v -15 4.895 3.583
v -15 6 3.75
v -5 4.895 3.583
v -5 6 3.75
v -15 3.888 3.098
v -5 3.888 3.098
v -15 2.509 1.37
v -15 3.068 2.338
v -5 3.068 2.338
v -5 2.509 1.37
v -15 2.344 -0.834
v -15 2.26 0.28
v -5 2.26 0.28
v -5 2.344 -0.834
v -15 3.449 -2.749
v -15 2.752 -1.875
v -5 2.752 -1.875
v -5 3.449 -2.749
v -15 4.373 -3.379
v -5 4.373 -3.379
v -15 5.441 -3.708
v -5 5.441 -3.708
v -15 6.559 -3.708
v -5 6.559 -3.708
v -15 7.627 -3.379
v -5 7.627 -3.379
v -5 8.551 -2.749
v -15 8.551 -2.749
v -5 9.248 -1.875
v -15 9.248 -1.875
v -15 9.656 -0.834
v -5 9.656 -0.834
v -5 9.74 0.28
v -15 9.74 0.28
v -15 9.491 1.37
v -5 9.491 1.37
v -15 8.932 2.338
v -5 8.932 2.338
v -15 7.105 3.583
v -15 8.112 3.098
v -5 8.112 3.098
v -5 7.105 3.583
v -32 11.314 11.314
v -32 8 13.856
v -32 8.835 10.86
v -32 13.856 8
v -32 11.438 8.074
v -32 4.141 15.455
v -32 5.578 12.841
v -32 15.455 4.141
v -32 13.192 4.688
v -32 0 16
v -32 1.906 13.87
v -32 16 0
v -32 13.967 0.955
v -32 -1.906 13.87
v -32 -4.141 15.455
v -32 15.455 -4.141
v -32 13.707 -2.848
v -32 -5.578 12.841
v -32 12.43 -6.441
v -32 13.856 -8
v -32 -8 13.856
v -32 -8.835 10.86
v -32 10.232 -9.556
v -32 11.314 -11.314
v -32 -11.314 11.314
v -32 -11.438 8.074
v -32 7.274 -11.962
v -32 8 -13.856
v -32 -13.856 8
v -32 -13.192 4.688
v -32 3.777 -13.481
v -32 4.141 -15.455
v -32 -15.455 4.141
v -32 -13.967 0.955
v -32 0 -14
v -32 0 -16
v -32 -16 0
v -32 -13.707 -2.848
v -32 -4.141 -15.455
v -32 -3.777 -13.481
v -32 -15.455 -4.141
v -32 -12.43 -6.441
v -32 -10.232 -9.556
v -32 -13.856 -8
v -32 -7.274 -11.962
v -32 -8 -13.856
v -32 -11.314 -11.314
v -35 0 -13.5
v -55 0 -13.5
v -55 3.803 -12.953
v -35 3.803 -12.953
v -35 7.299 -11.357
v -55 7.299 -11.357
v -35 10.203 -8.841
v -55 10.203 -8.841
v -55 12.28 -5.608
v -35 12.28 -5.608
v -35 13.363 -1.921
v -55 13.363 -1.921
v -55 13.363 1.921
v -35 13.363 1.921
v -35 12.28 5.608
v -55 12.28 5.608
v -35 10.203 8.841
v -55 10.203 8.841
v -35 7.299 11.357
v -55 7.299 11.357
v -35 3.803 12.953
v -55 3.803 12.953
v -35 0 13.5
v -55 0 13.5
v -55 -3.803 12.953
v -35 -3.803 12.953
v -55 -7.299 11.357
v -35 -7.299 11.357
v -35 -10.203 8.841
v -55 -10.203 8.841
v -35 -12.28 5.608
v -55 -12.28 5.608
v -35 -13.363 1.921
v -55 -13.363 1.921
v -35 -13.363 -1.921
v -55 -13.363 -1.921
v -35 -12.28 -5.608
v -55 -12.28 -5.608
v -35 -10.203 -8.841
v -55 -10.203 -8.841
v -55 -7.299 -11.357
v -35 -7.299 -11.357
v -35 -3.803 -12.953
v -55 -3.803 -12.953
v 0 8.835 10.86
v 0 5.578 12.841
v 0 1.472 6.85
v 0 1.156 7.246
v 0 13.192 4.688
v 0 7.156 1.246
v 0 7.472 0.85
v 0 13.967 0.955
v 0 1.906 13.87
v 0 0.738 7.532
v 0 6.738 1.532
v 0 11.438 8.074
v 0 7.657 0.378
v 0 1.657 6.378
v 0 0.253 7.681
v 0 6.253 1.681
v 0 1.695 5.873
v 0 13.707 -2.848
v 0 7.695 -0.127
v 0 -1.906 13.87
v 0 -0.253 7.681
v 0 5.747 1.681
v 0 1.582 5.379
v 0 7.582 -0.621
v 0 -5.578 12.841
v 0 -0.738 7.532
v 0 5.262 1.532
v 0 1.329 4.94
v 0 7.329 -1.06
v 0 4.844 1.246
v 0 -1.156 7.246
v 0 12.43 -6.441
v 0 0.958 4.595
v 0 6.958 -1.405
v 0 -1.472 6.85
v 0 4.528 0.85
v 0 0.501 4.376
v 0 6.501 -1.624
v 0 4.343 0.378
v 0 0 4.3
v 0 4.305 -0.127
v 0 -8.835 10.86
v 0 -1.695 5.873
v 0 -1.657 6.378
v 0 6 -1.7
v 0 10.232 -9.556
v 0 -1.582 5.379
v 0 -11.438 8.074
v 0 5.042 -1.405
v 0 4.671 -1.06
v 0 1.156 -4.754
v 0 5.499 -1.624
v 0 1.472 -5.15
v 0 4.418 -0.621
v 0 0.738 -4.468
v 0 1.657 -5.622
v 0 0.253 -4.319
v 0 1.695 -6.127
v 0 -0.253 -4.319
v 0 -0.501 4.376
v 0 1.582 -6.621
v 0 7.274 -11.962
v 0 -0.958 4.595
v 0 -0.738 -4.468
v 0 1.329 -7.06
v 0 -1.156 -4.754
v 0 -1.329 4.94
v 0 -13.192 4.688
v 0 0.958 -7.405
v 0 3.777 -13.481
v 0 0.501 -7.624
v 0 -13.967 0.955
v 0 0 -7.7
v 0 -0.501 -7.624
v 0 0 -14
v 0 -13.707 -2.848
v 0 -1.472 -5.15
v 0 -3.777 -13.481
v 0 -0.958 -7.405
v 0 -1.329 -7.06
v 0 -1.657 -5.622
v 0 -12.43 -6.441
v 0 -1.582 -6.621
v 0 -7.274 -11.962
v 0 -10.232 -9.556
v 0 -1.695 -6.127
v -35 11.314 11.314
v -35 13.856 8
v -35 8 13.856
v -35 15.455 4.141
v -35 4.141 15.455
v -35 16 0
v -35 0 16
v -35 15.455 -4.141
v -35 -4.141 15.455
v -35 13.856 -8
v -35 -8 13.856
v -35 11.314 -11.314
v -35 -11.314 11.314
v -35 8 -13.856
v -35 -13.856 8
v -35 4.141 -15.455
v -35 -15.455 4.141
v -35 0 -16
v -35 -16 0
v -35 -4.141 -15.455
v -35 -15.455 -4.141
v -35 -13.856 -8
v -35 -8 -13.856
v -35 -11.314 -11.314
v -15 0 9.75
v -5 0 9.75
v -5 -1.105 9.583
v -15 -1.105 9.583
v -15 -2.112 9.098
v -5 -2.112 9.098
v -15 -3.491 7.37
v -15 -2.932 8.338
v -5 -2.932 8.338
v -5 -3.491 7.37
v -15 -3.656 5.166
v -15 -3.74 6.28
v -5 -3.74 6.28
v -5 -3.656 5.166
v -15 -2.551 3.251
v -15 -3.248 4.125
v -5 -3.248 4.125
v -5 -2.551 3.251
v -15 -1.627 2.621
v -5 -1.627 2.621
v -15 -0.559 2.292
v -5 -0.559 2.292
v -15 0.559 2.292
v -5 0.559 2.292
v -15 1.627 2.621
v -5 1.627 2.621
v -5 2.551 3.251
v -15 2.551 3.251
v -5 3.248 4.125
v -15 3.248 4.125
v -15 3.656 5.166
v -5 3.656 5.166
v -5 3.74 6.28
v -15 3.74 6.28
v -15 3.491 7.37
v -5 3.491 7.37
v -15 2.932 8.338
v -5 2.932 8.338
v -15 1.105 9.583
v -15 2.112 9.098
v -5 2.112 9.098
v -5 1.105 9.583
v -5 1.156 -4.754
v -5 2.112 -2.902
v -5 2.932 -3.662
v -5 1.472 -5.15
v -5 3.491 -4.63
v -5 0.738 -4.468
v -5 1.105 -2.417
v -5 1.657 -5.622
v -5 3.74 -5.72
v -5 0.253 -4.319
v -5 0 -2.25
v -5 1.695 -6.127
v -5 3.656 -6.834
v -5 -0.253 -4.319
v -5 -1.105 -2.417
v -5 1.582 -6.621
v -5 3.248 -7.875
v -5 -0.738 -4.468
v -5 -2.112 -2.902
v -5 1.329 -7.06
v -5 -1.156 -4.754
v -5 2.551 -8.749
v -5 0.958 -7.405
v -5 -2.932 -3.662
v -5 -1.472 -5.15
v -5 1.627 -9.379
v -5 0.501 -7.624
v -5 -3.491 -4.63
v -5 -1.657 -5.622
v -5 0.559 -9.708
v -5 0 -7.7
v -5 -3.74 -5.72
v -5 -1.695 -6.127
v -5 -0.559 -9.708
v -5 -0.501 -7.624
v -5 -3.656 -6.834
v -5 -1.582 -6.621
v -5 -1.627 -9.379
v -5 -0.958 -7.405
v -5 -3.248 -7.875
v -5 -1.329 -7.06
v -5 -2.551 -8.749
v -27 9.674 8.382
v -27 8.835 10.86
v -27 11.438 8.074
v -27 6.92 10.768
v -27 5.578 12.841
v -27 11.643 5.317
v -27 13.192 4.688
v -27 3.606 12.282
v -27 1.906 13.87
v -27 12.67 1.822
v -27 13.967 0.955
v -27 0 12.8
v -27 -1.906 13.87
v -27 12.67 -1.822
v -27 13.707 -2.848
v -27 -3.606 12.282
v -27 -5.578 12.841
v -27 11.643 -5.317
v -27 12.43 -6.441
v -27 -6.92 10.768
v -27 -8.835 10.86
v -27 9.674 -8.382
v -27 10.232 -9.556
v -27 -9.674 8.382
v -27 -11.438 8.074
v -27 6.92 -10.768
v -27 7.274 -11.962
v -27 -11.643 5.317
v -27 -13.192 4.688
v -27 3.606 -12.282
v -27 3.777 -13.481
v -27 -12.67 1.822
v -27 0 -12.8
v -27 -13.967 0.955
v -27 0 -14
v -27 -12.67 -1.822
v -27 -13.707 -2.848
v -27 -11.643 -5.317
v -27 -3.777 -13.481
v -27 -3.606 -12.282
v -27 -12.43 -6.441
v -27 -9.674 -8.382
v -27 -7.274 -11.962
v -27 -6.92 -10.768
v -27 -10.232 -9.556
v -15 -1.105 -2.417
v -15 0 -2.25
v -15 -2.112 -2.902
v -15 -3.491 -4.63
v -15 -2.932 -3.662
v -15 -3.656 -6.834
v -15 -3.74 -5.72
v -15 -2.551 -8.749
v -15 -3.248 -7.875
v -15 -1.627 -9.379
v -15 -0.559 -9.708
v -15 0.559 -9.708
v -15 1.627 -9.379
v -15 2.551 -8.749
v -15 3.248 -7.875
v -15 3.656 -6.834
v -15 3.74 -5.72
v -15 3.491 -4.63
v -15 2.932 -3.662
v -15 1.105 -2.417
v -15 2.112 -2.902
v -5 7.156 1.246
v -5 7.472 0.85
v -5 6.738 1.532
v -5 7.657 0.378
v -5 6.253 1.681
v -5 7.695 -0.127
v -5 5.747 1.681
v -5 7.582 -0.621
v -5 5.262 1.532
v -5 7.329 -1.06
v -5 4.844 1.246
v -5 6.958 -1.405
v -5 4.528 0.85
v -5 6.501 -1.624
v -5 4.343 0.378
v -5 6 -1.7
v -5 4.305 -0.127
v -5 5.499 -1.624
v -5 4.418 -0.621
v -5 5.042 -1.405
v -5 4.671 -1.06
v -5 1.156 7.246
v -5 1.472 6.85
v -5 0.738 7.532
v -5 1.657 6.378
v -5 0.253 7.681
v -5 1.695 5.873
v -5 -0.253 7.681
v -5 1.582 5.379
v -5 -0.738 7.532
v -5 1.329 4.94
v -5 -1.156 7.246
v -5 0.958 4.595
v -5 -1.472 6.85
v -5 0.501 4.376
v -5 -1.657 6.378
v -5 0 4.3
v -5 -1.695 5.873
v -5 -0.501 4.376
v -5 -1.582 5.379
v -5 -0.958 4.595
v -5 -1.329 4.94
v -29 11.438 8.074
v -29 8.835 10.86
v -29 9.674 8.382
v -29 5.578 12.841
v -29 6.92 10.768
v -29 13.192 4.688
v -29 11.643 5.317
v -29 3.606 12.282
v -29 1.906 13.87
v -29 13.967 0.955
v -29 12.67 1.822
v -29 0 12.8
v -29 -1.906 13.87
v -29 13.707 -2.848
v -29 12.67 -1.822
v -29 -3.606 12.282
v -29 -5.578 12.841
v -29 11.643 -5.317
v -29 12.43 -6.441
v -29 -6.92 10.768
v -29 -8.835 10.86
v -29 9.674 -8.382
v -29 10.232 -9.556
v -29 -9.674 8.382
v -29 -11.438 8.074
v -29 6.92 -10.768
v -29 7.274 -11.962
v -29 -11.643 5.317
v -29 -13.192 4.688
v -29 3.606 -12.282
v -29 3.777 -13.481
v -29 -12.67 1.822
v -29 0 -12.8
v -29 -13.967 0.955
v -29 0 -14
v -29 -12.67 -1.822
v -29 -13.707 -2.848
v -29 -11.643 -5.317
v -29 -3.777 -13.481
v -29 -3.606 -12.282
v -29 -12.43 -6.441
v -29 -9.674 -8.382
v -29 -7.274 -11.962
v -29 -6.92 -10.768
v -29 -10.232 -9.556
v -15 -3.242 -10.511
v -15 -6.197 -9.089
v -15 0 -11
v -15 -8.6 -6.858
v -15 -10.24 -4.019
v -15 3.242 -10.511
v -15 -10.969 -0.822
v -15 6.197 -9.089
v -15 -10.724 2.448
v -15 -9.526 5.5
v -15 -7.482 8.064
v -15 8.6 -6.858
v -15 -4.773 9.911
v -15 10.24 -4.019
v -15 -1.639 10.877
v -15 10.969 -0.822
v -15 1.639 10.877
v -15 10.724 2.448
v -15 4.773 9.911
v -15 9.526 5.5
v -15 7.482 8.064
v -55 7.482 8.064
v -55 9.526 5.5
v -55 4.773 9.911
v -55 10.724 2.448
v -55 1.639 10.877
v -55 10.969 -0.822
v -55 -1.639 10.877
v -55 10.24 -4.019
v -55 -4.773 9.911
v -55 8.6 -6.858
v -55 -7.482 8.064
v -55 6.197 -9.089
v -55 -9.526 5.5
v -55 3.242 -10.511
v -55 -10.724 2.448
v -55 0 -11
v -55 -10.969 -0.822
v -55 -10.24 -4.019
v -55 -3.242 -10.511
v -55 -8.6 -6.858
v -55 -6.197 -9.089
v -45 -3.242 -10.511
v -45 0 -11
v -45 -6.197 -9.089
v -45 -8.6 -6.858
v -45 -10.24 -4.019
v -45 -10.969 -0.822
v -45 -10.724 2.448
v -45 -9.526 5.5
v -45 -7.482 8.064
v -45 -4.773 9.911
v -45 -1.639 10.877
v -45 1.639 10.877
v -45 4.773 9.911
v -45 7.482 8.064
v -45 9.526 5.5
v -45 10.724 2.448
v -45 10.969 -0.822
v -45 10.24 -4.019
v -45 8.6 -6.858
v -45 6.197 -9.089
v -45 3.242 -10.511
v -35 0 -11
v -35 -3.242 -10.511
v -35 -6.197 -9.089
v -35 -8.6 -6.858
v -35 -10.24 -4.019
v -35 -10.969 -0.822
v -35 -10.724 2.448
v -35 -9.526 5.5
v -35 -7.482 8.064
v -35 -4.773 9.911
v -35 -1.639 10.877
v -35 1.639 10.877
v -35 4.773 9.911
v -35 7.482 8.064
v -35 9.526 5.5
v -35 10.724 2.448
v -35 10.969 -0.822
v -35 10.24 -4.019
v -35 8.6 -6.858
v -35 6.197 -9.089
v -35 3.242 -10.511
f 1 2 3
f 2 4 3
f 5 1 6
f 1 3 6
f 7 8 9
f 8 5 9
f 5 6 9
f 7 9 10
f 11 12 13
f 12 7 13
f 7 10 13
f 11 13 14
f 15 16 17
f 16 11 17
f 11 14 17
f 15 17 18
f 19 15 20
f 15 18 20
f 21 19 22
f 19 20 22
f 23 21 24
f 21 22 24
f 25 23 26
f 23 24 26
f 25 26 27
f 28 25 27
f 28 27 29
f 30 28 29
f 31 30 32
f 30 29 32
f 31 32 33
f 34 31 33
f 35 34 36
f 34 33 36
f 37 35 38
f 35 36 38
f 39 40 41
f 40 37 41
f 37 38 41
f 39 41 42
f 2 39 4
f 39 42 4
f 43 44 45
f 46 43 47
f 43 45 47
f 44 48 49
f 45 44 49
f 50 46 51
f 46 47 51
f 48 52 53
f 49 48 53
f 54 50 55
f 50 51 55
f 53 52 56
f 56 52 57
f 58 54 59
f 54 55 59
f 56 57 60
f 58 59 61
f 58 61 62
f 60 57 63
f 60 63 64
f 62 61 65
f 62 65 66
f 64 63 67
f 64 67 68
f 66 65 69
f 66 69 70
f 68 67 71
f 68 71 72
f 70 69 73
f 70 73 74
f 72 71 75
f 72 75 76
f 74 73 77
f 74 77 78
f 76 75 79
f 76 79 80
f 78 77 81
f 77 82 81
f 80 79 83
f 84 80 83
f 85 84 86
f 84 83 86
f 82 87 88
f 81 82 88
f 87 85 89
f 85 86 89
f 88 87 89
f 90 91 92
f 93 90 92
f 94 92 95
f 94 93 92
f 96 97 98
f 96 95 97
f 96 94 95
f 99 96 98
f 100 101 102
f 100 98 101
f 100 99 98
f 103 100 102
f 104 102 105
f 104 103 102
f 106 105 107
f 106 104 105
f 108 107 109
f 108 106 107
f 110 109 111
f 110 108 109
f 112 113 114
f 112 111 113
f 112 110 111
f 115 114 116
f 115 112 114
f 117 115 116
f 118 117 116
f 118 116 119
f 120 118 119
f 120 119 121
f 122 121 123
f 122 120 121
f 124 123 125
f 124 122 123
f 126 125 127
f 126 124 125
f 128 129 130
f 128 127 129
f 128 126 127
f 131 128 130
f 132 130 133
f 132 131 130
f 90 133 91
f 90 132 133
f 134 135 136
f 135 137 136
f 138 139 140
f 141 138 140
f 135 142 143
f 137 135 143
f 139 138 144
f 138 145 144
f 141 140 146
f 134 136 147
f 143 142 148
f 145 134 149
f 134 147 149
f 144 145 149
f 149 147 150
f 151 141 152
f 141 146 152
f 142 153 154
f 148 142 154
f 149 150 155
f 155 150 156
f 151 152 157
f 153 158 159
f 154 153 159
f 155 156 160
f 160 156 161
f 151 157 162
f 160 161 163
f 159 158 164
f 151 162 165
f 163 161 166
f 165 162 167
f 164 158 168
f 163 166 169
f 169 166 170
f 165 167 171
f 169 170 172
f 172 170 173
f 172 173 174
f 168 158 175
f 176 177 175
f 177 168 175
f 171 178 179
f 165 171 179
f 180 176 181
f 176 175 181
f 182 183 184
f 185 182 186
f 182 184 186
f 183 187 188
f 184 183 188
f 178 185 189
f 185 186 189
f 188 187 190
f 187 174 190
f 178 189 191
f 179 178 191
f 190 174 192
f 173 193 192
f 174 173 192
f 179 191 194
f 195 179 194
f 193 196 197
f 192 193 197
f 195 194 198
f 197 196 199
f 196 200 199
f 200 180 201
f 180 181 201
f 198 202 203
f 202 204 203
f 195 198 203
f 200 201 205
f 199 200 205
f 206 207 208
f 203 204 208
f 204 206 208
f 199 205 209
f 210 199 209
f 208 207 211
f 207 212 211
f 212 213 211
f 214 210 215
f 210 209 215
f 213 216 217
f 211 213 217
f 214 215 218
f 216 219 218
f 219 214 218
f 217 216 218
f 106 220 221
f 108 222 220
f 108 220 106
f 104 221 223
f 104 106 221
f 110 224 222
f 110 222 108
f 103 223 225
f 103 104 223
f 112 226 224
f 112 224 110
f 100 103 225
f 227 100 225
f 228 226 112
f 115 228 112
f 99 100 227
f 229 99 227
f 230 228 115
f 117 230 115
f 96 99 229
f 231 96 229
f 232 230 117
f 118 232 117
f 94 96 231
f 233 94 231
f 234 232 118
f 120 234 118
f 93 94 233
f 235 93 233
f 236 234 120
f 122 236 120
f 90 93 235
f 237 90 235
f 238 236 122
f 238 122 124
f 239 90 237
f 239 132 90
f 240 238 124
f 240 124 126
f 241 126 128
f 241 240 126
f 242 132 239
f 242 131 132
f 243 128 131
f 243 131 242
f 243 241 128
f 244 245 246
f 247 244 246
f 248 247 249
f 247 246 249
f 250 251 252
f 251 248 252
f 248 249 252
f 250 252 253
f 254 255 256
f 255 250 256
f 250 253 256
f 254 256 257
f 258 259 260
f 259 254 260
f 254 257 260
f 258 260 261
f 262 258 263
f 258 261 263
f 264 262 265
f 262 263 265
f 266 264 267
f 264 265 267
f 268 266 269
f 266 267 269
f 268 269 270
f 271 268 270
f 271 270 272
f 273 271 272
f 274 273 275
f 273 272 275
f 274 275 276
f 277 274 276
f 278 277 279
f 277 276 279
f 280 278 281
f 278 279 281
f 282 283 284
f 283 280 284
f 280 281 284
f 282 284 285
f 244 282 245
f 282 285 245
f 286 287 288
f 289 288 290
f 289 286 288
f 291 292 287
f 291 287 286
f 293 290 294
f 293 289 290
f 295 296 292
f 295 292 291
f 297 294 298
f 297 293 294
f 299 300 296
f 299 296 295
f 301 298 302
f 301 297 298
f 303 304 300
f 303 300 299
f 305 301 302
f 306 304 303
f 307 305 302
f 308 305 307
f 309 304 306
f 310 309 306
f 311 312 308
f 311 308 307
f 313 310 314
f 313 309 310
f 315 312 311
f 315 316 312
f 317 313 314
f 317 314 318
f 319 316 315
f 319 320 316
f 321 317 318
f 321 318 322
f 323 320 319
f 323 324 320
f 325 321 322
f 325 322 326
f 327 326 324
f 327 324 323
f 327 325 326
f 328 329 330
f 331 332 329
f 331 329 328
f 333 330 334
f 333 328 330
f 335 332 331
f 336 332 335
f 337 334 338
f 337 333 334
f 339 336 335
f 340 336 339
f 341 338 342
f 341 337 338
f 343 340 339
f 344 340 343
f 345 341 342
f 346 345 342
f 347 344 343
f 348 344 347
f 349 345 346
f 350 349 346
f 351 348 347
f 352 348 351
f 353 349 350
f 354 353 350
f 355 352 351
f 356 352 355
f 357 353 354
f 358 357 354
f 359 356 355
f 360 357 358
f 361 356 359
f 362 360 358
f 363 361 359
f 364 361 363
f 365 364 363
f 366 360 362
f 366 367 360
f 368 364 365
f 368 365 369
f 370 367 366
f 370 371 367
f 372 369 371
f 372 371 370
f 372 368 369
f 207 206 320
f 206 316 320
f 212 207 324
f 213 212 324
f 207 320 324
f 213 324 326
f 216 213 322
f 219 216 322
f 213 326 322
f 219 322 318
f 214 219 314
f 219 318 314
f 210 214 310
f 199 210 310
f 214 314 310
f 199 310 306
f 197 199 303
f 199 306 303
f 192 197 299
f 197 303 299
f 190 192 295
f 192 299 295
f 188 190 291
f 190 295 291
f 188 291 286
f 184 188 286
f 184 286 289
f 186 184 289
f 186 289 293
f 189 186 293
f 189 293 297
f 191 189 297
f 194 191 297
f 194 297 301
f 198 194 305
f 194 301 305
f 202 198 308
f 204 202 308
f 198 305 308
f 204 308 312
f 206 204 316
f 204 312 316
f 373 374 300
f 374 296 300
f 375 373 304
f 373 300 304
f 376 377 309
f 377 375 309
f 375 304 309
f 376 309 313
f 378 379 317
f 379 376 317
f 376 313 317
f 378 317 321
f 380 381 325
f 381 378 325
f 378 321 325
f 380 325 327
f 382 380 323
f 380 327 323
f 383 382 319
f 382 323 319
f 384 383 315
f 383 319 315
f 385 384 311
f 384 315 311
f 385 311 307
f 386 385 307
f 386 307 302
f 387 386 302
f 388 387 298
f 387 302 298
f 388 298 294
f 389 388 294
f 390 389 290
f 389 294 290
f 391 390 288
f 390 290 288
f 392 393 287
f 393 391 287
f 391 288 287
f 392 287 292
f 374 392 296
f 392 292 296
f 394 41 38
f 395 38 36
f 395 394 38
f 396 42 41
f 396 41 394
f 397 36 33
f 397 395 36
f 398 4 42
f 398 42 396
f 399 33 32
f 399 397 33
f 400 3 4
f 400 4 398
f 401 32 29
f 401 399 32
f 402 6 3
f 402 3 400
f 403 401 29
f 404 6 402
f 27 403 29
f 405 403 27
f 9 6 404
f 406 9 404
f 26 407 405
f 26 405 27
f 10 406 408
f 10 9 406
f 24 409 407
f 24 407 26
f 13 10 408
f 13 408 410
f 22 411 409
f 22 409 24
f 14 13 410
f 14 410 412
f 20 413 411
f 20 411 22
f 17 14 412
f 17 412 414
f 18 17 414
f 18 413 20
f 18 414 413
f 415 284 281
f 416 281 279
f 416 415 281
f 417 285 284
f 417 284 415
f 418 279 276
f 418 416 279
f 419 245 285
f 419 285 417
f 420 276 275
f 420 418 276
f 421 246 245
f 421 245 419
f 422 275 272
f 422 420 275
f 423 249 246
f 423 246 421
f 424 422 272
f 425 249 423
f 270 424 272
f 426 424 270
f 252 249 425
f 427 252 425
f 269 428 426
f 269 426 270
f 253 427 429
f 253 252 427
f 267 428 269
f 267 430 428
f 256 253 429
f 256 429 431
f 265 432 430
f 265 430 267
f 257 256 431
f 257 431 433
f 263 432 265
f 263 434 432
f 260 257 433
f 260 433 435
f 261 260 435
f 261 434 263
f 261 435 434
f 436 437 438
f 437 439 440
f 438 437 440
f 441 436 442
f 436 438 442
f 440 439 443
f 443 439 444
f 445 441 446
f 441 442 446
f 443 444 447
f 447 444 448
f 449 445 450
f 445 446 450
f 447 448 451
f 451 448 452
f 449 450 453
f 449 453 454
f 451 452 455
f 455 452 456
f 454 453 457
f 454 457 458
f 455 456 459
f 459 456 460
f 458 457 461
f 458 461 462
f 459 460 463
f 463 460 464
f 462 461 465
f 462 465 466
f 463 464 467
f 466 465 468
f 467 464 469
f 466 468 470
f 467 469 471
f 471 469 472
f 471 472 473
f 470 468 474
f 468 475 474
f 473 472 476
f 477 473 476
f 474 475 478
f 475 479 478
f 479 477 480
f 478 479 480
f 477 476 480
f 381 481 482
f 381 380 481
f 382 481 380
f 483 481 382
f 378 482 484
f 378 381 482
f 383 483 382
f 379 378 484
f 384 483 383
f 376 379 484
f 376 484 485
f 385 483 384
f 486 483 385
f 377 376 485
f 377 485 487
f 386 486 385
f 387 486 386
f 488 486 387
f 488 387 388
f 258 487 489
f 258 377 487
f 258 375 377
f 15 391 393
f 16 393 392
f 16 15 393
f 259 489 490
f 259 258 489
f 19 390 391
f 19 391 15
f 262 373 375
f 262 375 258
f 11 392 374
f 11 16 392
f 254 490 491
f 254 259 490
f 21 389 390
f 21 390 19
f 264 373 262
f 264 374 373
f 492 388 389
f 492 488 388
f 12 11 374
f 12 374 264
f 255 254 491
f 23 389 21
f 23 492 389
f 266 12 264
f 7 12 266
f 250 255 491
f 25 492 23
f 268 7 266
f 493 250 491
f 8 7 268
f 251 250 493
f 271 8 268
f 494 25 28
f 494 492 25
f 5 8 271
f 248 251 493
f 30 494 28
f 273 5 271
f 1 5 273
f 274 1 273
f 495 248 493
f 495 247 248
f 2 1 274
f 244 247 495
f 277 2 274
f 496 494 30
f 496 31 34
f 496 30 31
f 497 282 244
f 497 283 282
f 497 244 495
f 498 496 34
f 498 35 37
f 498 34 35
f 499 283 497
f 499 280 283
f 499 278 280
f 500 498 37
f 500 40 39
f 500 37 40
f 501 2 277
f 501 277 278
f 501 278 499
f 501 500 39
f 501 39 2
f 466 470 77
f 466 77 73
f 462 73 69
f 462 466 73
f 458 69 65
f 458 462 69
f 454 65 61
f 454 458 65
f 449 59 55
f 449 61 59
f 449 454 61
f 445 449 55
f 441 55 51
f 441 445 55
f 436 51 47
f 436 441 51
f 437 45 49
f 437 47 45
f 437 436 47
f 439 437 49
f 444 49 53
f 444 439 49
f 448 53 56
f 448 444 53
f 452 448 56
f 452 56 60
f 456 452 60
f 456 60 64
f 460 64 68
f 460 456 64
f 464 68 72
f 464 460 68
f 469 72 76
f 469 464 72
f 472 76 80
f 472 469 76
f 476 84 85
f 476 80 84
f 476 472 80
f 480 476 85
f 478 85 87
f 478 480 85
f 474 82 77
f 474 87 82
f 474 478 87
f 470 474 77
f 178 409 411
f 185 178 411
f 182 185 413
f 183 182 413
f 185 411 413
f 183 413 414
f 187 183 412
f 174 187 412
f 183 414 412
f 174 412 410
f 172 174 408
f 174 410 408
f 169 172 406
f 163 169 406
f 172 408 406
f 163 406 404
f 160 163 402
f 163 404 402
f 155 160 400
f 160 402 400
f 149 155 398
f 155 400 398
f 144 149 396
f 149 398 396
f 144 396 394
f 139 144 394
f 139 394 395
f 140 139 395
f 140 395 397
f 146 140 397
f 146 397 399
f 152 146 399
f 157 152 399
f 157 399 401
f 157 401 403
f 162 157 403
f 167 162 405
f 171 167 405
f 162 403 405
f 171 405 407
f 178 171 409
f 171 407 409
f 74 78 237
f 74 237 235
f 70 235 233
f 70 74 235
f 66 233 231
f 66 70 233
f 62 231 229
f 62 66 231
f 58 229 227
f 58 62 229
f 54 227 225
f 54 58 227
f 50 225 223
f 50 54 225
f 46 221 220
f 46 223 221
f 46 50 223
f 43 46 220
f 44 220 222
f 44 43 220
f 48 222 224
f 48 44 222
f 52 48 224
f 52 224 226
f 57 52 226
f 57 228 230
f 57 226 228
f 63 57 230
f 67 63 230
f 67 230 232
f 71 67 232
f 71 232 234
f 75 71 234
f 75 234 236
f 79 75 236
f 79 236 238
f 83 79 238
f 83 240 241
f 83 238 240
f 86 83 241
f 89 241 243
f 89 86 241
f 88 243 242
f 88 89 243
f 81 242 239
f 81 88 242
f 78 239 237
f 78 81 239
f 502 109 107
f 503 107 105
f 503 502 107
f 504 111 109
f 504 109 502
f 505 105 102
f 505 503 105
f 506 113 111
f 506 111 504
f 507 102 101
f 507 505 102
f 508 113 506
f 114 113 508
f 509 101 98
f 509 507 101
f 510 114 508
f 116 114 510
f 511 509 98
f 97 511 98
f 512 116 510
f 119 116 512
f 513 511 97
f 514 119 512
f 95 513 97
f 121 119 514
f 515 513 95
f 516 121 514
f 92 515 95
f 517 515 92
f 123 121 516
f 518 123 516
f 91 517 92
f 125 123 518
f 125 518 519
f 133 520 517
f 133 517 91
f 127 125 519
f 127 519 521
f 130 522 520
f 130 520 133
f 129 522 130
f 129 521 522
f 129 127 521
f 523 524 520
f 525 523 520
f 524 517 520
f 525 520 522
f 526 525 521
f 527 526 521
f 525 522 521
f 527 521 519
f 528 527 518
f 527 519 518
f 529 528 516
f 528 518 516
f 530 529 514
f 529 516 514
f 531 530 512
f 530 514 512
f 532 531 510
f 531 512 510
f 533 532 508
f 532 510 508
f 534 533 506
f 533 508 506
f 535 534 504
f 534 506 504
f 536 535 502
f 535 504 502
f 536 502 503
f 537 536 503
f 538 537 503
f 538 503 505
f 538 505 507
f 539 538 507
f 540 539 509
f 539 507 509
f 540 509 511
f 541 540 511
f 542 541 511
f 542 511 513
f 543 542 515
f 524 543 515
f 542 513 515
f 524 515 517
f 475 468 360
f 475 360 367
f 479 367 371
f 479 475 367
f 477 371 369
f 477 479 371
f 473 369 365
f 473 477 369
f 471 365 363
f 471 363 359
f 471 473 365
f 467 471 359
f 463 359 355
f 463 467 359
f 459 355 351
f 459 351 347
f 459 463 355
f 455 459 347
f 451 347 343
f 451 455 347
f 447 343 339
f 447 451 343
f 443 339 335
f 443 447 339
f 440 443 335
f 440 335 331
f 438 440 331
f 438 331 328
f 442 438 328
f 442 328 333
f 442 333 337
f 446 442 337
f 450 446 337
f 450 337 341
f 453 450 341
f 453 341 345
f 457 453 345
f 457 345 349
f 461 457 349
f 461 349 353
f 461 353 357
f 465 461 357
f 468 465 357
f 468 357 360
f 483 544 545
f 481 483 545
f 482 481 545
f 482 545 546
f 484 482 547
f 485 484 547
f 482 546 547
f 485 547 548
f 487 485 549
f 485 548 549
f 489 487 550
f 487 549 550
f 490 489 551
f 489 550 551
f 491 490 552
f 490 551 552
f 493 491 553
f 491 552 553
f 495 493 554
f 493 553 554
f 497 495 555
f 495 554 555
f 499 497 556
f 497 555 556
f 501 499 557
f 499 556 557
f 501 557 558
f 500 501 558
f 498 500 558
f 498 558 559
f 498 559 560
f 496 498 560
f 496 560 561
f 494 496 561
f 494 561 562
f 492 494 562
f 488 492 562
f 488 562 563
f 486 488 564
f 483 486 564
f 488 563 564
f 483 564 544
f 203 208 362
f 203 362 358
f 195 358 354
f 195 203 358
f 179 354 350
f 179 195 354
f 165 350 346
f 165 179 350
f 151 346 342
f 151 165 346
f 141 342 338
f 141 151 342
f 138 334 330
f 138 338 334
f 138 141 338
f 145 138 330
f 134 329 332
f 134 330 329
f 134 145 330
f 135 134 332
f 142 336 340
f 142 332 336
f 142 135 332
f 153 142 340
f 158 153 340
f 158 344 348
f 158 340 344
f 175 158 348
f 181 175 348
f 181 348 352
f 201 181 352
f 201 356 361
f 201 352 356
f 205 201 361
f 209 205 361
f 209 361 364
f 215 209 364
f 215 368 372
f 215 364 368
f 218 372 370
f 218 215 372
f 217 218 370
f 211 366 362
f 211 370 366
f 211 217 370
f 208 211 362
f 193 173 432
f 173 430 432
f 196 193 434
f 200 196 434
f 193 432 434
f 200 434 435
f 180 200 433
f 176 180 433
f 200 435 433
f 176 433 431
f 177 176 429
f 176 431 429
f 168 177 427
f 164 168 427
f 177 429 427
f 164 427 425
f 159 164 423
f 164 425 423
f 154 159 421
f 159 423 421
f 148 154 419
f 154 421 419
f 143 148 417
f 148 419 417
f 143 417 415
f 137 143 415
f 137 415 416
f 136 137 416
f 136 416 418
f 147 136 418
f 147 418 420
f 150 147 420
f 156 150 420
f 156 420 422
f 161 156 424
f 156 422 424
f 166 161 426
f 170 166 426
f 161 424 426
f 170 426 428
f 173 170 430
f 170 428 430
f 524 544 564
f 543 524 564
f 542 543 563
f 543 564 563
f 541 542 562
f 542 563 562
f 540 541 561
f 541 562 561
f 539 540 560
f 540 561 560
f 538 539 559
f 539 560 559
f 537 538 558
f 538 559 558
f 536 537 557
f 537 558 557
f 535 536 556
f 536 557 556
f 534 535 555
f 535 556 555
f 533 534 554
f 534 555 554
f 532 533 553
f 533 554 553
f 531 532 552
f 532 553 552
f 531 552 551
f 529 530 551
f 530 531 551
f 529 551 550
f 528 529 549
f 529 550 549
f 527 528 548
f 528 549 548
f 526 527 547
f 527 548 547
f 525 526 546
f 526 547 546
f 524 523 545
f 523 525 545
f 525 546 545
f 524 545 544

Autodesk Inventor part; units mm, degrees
ref_plane "YZ Plane" through (0, 0, 0) normal (1, 0, 0) x (0, 1, 0)
ref_plane "XZ Plane" through (0, 0, 0) normal (0, 1, 0) x (-1, 0, 0)
ref_plane "XY Plane" through (0, 0, 0) normal (0, 0, 1) x (1, 0, 0)
sketch "Sketch1" plane through (0, 0, 0) normal (0, 1, 0) x (-1, 0, 0)
  line L0 (0, 0) -> (35, 0)
  line L1 (35, 0) -> (35, -16)
  line L2 (35, -16) -> (32, -16)
  line L3 (32, -16) -> (32, -14)
  line L4 (32, -14) -> (0, -14)
  line L5 (0, -14) -> (0, 0)
  line L6 (35, 0) -> (45, 0)
  line L7 (45, 0) -> (45, -11)
  line L8 (45, -11) -> (35, -11)
  line L9 (5, 0) -> (5, -11)
  line L10 (5, -11) -> (45, -11)
  line L11 (27, -14) -> (27, -12.8)
  line L12 (27, -12.8) -> (29, -12.8)
  line L13 (29, -12.8) -> (29, -14)
  line L14 (45, -11) -> (55, -11)
  line L15 (55, -11) -> (55, -13.5)
  line L16 (55, -13.5) -> (35, -13.5)
  point P0 (35, -11)
  point P1 (32, -15)
  point P2 (27, -11)
  point P3 (29, -11)
  dimension "d0" = 28
  dimension "d1" = 32
  dimension "d2" = 3
  dimension "d3" = 35
  dimension "d5" = 10
  dimension "d6" = 5
  dimension "d7" = 3
  dimension "d18" = 2
  dimension "d20" = 22
  dimension "d21" = 3
  dimension "d24" = 1.2
  dimension "d25" = 50
  dimension "d26" = 2.5
revolve "Revolution1" add sketch "Sketch1" angle 360 about axis through (0, 0, 0) along (-1, 0, 0) contours L0 L9 L10 L1 L2 L3 L4 L13 L12 L11 L5 | L8 L14 L15 L16 L1
sketch "Sketch2" plane through (0, 0, 0) normal (1, 0, 0) x (0, 0, -1)
  point P0 (0, 0)
  point P1 (0, 0)
  point P2 (6, 0)
  point P3 (-6, 0)
  point P4 (0, 6)
  dimension "d22" = 6
  dimension "d23" = 6
  dimension "d27" = 6
hole "Hole1" at (0, 0, -6) at (0, 0, 6) at (0, 6, 0) direction (-1, 0, 0) diameter 3.4 end through all clearance for "Countersunk Flat Head Screw ISO 2009/7046" size "M3" standard "ISO"
sketch "Sketch3" plane through (-5, 0, 0) normal (-1, 0, 0) x (0, 0, 1)
  circle A0 centre (0, 6) radius 1.7 projected
  circle A1 centre (-6, 0) radius 1.7 projected
  circle A2 centre (6, 0) radius 1.7 projected
  circle A3 centre (6, 0) radius 3.75
  circle A4 centre (0, 6) radius 3.75
  circle A5 centre (-6, 0) radius 3.75
  circle A6 centre (6, 0) radius 1.7 projected
  circle A7 centre (-6, 0) radius 1.7 projected
  circle A8 centre (0, 6) radius 1.7 projected
  circle A9 centre (0, 0) radius 11 projected
  dimension "d28" = 7.5
  dimension "d29" = 7.5
  dimension "d30" = 7.5
extrude "Extrusion1" add sketch "Sketch3" along normal blind 10 contours A9
equation "\"d23\" = d22"
properties part number "028" material "PC/ABS Plastic"
